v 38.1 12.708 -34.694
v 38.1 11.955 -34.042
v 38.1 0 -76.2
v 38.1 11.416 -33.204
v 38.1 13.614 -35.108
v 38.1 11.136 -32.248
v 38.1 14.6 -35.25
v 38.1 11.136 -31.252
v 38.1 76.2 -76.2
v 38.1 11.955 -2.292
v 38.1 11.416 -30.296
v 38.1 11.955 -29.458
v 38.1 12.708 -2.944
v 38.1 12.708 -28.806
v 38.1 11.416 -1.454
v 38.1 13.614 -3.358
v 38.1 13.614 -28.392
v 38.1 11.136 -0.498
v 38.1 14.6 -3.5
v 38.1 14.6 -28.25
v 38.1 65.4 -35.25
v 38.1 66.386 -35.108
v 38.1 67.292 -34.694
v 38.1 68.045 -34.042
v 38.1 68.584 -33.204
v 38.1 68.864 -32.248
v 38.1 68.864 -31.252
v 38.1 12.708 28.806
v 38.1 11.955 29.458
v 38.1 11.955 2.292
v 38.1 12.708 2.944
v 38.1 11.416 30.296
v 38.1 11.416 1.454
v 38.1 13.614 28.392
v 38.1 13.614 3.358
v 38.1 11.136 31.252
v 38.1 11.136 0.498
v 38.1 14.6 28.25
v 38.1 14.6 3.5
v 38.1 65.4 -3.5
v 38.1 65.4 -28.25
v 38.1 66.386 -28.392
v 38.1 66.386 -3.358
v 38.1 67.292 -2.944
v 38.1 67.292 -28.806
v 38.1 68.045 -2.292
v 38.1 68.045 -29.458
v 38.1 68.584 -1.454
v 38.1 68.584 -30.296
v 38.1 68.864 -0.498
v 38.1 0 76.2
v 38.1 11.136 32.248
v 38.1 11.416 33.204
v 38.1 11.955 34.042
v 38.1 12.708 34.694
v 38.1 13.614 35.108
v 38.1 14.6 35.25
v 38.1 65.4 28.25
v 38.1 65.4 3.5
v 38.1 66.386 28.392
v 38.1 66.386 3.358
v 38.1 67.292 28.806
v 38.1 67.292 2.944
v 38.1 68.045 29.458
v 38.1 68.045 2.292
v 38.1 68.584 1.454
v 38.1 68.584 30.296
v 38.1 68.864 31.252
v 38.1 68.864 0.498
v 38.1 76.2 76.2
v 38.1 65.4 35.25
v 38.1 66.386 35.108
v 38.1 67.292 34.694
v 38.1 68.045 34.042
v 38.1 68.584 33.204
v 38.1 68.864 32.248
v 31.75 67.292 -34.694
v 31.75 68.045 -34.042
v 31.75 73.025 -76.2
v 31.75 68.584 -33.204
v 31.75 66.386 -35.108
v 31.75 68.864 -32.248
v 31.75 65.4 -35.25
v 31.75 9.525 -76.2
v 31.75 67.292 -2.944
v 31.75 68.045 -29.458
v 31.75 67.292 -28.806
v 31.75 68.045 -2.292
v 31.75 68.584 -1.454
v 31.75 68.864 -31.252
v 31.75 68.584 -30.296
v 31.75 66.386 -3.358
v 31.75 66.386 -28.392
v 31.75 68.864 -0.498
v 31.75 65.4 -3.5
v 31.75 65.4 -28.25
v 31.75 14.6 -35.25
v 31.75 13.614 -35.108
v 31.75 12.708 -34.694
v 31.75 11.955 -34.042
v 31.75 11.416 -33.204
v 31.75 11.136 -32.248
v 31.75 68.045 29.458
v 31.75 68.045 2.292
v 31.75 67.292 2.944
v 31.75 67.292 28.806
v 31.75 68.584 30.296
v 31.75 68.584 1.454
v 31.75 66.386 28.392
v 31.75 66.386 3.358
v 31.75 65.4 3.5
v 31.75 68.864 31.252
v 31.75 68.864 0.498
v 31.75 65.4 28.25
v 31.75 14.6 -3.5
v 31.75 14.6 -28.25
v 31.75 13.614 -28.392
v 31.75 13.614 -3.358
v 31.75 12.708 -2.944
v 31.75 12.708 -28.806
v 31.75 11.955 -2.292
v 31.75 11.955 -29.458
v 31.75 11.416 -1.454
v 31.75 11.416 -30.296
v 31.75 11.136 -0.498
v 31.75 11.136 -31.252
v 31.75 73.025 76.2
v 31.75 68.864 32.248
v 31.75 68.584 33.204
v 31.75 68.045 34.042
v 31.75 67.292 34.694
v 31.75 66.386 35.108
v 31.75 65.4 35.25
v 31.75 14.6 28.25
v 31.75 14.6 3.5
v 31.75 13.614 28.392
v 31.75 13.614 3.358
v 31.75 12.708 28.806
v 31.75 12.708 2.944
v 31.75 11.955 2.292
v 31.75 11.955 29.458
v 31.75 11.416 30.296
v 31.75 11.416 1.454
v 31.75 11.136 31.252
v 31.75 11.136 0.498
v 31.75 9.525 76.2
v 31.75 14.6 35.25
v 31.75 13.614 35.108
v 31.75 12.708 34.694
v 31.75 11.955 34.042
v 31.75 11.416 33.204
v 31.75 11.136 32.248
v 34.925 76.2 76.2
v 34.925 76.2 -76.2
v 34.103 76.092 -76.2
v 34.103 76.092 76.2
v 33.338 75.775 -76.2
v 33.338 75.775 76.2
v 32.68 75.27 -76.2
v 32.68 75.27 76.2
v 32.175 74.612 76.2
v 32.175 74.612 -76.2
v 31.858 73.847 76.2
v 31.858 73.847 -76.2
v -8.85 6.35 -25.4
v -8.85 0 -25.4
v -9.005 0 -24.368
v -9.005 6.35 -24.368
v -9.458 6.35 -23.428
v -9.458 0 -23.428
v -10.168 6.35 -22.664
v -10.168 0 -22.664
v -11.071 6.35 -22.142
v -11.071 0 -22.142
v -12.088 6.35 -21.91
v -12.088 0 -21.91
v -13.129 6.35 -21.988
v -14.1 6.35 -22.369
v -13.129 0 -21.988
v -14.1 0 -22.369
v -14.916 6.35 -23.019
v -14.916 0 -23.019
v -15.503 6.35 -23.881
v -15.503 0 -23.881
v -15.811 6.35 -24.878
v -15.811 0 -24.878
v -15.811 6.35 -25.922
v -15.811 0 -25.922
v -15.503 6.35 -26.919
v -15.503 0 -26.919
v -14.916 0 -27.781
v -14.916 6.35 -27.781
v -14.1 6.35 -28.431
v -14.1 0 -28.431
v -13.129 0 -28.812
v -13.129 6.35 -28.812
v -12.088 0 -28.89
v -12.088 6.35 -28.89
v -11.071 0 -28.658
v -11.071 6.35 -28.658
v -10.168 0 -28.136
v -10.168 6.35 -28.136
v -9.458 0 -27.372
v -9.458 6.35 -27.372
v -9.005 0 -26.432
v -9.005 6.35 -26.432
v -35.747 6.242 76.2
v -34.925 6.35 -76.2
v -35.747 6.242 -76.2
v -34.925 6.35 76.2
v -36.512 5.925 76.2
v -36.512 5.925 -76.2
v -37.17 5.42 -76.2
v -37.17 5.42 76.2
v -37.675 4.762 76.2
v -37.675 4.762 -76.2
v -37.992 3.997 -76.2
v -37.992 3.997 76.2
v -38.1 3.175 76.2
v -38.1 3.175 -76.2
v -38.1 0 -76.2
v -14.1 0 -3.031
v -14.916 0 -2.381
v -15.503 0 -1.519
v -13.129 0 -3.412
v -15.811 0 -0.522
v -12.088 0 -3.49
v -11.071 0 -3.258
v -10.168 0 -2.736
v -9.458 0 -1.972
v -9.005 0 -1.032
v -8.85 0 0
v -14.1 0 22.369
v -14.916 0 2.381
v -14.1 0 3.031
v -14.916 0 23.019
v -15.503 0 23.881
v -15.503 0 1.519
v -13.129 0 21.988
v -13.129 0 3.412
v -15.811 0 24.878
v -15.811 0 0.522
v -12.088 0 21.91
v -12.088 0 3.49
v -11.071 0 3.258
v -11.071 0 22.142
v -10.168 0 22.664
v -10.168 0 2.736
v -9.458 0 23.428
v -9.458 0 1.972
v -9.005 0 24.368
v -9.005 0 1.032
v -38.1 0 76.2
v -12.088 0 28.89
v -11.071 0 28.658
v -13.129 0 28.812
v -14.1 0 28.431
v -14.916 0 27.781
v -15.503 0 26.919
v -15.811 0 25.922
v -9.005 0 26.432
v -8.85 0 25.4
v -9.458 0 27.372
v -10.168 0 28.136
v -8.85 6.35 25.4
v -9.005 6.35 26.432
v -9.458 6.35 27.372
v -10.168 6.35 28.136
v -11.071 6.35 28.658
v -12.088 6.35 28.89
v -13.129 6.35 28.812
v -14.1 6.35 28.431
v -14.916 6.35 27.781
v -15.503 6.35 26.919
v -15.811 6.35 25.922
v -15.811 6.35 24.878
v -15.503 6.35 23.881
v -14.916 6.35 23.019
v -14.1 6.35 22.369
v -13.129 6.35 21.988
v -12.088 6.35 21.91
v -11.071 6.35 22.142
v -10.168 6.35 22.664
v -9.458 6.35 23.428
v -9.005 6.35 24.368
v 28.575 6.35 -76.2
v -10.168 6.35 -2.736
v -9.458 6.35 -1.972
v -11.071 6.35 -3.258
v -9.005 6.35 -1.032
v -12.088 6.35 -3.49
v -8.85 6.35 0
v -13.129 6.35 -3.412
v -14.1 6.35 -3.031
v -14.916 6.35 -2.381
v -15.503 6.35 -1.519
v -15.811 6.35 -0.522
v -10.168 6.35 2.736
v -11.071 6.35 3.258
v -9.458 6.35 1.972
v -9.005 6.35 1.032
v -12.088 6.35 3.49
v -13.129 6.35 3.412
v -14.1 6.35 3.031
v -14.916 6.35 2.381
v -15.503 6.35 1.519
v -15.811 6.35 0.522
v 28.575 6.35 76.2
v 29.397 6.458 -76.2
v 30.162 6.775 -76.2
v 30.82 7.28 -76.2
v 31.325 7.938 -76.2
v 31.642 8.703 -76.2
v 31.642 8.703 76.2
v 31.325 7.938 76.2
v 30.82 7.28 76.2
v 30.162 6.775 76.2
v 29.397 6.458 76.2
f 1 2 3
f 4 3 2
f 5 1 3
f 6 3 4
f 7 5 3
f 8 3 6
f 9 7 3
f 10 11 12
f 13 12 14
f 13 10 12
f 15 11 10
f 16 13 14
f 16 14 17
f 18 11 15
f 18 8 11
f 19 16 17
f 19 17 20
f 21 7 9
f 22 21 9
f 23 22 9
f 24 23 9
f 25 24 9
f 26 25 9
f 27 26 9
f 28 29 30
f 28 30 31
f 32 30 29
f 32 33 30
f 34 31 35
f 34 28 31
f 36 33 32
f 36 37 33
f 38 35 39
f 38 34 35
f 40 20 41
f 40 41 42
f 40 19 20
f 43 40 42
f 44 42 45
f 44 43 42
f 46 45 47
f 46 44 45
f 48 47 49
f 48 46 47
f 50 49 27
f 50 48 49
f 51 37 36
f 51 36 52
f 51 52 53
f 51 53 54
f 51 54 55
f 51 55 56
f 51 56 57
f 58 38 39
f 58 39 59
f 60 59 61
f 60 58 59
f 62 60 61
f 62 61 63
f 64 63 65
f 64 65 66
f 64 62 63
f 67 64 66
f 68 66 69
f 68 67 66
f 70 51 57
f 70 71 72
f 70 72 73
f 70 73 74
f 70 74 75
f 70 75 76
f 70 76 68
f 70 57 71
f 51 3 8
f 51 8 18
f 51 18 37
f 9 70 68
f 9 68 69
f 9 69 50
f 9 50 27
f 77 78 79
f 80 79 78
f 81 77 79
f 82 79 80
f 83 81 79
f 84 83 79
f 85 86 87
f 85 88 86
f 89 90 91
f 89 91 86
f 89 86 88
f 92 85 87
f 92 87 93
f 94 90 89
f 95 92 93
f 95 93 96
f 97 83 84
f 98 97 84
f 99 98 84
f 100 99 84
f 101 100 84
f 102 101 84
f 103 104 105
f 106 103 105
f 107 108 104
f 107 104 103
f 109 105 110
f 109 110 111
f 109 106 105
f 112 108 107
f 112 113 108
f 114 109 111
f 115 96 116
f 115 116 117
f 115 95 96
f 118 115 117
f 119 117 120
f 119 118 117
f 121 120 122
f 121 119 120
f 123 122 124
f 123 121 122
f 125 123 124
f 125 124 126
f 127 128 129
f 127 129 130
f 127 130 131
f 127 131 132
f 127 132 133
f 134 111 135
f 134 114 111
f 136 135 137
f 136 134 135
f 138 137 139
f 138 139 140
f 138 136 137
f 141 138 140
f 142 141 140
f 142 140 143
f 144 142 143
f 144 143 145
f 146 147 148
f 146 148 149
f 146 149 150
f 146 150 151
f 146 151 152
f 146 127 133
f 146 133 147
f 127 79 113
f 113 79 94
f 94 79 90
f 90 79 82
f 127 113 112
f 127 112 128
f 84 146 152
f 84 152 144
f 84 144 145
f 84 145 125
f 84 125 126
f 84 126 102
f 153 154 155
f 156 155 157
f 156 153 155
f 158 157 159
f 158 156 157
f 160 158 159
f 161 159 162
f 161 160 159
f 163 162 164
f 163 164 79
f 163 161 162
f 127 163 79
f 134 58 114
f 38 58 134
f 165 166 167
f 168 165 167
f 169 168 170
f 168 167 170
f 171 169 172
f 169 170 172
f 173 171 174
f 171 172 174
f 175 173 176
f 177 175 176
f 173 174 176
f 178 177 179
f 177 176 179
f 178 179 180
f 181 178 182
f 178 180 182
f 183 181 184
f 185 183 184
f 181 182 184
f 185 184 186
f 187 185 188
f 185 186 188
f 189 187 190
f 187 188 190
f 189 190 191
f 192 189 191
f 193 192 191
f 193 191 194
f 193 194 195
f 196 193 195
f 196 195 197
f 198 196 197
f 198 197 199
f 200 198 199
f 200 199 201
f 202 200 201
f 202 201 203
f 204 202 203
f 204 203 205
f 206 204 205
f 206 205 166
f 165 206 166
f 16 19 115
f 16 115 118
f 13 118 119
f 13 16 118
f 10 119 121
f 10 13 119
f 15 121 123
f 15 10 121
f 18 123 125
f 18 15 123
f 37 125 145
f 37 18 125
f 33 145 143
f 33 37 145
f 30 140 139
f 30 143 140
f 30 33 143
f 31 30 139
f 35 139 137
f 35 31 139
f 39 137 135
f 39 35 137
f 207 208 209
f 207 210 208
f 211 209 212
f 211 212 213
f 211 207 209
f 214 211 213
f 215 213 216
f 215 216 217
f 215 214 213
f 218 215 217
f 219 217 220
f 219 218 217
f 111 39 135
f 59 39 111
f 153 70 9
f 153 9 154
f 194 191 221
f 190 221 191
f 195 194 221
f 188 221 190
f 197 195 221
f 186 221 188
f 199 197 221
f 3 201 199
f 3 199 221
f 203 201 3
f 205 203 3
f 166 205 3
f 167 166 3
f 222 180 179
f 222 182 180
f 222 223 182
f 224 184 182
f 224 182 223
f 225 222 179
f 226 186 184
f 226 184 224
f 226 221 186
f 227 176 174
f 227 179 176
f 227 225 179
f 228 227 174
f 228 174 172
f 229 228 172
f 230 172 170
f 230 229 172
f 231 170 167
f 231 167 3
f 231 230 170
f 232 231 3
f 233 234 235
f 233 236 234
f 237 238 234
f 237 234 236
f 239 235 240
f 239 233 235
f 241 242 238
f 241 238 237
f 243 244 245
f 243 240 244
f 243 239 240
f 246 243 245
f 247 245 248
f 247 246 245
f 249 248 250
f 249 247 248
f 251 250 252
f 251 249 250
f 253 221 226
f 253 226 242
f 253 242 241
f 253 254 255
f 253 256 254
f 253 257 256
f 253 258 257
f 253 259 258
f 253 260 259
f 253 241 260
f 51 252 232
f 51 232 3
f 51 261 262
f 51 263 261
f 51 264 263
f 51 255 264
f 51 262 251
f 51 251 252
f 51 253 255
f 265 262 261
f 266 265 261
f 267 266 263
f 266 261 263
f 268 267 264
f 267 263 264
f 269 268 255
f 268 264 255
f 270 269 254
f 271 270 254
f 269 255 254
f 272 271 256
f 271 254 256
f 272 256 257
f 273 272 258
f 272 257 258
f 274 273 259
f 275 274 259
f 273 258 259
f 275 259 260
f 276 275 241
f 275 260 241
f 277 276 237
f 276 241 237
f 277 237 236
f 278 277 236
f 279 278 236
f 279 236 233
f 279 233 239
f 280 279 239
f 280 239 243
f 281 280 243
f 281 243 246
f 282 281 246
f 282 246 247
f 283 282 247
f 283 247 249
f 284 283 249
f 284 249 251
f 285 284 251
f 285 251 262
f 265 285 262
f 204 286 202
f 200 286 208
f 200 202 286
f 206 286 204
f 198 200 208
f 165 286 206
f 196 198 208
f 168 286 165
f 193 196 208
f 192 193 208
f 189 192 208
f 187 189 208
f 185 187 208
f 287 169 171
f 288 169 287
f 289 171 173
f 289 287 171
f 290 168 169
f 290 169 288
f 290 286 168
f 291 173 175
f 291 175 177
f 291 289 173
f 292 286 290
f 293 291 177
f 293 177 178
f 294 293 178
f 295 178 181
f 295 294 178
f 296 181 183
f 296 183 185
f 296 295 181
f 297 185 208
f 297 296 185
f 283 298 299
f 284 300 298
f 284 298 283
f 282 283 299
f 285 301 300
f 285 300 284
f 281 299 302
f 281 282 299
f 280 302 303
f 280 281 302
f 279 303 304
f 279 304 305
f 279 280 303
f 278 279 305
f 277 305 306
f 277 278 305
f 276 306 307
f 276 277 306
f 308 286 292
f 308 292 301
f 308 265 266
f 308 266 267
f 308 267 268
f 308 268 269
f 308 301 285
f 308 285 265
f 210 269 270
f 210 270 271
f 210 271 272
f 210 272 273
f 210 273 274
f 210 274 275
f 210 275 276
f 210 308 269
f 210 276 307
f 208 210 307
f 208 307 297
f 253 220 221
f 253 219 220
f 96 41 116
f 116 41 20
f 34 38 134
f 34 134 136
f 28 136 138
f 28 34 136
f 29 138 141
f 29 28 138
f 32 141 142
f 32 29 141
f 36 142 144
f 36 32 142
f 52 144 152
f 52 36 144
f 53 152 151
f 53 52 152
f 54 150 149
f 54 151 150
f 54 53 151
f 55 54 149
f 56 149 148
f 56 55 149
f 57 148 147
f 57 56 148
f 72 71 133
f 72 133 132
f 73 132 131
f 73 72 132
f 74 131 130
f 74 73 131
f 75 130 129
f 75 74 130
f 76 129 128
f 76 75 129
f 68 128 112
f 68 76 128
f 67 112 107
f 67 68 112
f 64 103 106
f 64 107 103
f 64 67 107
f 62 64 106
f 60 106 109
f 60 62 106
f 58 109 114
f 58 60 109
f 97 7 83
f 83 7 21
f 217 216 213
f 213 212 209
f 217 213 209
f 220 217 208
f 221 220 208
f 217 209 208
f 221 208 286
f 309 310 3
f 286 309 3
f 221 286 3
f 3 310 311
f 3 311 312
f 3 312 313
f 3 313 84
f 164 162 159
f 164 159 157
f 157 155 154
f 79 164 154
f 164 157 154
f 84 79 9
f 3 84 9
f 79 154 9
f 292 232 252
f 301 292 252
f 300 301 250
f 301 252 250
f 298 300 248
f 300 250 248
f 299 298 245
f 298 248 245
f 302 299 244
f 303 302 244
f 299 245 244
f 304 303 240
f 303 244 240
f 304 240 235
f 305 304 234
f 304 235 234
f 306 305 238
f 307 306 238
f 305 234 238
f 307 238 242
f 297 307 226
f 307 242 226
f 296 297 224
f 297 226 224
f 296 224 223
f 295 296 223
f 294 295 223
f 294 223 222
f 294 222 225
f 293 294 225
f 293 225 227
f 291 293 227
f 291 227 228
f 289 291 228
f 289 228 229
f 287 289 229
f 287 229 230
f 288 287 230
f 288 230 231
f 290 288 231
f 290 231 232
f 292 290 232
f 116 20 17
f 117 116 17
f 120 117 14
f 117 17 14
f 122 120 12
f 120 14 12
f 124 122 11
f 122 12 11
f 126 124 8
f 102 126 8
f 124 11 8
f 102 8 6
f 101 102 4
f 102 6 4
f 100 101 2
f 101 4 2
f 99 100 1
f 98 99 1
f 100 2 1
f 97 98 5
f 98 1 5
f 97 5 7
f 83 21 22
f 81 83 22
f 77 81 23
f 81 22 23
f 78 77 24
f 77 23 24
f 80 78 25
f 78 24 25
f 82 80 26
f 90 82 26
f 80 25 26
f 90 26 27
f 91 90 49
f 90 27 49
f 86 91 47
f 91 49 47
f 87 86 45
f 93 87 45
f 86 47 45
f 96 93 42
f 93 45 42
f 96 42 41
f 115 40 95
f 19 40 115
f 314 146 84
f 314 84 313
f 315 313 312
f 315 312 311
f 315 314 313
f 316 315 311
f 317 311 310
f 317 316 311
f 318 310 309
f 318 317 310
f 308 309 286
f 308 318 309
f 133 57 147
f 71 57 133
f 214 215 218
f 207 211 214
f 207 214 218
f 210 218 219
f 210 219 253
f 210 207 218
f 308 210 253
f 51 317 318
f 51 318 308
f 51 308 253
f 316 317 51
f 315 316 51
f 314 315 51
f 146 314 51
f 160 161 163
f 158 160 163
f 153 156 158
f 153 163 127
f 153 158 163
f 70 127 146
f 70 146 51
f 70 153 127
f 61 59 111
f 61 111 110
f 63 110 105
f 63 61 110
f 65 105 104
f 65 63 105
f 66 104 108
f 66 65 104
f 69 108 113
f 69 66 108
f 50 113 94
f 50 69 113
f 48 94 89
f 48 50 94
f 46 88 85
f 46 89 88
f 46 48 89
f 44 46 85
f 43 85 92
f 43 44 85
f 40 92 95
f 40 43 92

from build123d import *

# Parameters (mm, degrees)
BOSS_EXTRUDE1_DEPTH = 76.2
CUT_EXTRUDE1_DEPTH  = 10
SKETCH4_R           = 3.5
CUT_EXTRUDE2_DEPTH  = 10


with BuildPart() as part:
    # Sketch2 → Boss-Extrude1 (new body, symmetric)
    with BuildSketch(Plane.XY):
        with BuildLine():
            Line((-38.1, 0), (38.1, 0))
            Line((38.1, 0), (38.1, 76.2))
            Line((38.1, 76.2), (34.925, 76.2))
            ThreePointArc((34.925, 76.2), (32.67993597, 75.27006403), (31.75, 73.025))
            Line((31.75, 73.025), (31.75, 9.525))
            ThreePointArc((31.75, 9.525), (30.82006403, 7.27993597), (28.575, 6.35))
            Line((28.575, 6.35), (-34.925, 6.35))
            ThreePointArc((-34.925, 6.35), (-37.17006403, 5.42006403), (-38.1, 3.175))
            Line((-38.1, 3.175), (-38.1, 0))
        make_face()
    extrude(amount=BOSS_EXTRUDE1_DEPTH, both=True)

    # Sketch3 → Cut-Extrude1 (cut)
    with BuildSketch(Plane(origin=(38.1, 0, 0), x_dir=(0, 0, -1), z_dir=(1, 0, 0))):
        with BuildLine():
            Line((-28.25, 65.4), (-28.25, 14.6))
            ThreePointArc((-28.25, 14.6), (-31.75, 11.1), (-35.25, 14.6))
            Line((-35.25, 14.6), (-35.25, 65.4))
            ThreePointArc((-35.25, 65.4), (-31.75, 68.9), (-28.25, 65.4))
        make_face()
        with BuildLine():
            Line((28.25, 65.4), (28.25, 14.6))
            ThreePointArc((28.25, 14.6), (31.75, 11.1), (35.25, 14.6))
            Line((35.25, 14.6), (35.25, 65.4))
            ThreePointArc((35.25, 65.4), (31.75, 68.9), (28.25, 65.4))
        make_face()
        with BuildLine():
            Line((3.5, 65.4), (3.5, 14.6))
            ThreePointArc((3.5, 14.6), (0, 11.1), (-3.5, 14.6))
            Line((-3.5, 14.6), (-3.5, 65.4))
            ThreePointArc((-3.5, 65.4), (0, 68.9), (3.5, 65.4))
        make_face()
    extrude(amount=-CUT_EXTRUDE1_DEPTH, mode=Mode.SUBTRACT)

    # Sketch4 → Cut-Extrude2 (cut)
    with BuildSketch(Plane.XZ):
        with Locations((-12.35, 25.4)):
            Circle(SKETCH4_R)
        with Locations((-12.35, -25.4)):
            Circle(SKETCH4_R)
        with Locations((-12.35, 0)):
            Circle(SKETCH4_R)
    extrude(amount=-CUT_EXTRUDE2_DEPTH, mode=Mode.SUBTRACT)


solid = part.part
